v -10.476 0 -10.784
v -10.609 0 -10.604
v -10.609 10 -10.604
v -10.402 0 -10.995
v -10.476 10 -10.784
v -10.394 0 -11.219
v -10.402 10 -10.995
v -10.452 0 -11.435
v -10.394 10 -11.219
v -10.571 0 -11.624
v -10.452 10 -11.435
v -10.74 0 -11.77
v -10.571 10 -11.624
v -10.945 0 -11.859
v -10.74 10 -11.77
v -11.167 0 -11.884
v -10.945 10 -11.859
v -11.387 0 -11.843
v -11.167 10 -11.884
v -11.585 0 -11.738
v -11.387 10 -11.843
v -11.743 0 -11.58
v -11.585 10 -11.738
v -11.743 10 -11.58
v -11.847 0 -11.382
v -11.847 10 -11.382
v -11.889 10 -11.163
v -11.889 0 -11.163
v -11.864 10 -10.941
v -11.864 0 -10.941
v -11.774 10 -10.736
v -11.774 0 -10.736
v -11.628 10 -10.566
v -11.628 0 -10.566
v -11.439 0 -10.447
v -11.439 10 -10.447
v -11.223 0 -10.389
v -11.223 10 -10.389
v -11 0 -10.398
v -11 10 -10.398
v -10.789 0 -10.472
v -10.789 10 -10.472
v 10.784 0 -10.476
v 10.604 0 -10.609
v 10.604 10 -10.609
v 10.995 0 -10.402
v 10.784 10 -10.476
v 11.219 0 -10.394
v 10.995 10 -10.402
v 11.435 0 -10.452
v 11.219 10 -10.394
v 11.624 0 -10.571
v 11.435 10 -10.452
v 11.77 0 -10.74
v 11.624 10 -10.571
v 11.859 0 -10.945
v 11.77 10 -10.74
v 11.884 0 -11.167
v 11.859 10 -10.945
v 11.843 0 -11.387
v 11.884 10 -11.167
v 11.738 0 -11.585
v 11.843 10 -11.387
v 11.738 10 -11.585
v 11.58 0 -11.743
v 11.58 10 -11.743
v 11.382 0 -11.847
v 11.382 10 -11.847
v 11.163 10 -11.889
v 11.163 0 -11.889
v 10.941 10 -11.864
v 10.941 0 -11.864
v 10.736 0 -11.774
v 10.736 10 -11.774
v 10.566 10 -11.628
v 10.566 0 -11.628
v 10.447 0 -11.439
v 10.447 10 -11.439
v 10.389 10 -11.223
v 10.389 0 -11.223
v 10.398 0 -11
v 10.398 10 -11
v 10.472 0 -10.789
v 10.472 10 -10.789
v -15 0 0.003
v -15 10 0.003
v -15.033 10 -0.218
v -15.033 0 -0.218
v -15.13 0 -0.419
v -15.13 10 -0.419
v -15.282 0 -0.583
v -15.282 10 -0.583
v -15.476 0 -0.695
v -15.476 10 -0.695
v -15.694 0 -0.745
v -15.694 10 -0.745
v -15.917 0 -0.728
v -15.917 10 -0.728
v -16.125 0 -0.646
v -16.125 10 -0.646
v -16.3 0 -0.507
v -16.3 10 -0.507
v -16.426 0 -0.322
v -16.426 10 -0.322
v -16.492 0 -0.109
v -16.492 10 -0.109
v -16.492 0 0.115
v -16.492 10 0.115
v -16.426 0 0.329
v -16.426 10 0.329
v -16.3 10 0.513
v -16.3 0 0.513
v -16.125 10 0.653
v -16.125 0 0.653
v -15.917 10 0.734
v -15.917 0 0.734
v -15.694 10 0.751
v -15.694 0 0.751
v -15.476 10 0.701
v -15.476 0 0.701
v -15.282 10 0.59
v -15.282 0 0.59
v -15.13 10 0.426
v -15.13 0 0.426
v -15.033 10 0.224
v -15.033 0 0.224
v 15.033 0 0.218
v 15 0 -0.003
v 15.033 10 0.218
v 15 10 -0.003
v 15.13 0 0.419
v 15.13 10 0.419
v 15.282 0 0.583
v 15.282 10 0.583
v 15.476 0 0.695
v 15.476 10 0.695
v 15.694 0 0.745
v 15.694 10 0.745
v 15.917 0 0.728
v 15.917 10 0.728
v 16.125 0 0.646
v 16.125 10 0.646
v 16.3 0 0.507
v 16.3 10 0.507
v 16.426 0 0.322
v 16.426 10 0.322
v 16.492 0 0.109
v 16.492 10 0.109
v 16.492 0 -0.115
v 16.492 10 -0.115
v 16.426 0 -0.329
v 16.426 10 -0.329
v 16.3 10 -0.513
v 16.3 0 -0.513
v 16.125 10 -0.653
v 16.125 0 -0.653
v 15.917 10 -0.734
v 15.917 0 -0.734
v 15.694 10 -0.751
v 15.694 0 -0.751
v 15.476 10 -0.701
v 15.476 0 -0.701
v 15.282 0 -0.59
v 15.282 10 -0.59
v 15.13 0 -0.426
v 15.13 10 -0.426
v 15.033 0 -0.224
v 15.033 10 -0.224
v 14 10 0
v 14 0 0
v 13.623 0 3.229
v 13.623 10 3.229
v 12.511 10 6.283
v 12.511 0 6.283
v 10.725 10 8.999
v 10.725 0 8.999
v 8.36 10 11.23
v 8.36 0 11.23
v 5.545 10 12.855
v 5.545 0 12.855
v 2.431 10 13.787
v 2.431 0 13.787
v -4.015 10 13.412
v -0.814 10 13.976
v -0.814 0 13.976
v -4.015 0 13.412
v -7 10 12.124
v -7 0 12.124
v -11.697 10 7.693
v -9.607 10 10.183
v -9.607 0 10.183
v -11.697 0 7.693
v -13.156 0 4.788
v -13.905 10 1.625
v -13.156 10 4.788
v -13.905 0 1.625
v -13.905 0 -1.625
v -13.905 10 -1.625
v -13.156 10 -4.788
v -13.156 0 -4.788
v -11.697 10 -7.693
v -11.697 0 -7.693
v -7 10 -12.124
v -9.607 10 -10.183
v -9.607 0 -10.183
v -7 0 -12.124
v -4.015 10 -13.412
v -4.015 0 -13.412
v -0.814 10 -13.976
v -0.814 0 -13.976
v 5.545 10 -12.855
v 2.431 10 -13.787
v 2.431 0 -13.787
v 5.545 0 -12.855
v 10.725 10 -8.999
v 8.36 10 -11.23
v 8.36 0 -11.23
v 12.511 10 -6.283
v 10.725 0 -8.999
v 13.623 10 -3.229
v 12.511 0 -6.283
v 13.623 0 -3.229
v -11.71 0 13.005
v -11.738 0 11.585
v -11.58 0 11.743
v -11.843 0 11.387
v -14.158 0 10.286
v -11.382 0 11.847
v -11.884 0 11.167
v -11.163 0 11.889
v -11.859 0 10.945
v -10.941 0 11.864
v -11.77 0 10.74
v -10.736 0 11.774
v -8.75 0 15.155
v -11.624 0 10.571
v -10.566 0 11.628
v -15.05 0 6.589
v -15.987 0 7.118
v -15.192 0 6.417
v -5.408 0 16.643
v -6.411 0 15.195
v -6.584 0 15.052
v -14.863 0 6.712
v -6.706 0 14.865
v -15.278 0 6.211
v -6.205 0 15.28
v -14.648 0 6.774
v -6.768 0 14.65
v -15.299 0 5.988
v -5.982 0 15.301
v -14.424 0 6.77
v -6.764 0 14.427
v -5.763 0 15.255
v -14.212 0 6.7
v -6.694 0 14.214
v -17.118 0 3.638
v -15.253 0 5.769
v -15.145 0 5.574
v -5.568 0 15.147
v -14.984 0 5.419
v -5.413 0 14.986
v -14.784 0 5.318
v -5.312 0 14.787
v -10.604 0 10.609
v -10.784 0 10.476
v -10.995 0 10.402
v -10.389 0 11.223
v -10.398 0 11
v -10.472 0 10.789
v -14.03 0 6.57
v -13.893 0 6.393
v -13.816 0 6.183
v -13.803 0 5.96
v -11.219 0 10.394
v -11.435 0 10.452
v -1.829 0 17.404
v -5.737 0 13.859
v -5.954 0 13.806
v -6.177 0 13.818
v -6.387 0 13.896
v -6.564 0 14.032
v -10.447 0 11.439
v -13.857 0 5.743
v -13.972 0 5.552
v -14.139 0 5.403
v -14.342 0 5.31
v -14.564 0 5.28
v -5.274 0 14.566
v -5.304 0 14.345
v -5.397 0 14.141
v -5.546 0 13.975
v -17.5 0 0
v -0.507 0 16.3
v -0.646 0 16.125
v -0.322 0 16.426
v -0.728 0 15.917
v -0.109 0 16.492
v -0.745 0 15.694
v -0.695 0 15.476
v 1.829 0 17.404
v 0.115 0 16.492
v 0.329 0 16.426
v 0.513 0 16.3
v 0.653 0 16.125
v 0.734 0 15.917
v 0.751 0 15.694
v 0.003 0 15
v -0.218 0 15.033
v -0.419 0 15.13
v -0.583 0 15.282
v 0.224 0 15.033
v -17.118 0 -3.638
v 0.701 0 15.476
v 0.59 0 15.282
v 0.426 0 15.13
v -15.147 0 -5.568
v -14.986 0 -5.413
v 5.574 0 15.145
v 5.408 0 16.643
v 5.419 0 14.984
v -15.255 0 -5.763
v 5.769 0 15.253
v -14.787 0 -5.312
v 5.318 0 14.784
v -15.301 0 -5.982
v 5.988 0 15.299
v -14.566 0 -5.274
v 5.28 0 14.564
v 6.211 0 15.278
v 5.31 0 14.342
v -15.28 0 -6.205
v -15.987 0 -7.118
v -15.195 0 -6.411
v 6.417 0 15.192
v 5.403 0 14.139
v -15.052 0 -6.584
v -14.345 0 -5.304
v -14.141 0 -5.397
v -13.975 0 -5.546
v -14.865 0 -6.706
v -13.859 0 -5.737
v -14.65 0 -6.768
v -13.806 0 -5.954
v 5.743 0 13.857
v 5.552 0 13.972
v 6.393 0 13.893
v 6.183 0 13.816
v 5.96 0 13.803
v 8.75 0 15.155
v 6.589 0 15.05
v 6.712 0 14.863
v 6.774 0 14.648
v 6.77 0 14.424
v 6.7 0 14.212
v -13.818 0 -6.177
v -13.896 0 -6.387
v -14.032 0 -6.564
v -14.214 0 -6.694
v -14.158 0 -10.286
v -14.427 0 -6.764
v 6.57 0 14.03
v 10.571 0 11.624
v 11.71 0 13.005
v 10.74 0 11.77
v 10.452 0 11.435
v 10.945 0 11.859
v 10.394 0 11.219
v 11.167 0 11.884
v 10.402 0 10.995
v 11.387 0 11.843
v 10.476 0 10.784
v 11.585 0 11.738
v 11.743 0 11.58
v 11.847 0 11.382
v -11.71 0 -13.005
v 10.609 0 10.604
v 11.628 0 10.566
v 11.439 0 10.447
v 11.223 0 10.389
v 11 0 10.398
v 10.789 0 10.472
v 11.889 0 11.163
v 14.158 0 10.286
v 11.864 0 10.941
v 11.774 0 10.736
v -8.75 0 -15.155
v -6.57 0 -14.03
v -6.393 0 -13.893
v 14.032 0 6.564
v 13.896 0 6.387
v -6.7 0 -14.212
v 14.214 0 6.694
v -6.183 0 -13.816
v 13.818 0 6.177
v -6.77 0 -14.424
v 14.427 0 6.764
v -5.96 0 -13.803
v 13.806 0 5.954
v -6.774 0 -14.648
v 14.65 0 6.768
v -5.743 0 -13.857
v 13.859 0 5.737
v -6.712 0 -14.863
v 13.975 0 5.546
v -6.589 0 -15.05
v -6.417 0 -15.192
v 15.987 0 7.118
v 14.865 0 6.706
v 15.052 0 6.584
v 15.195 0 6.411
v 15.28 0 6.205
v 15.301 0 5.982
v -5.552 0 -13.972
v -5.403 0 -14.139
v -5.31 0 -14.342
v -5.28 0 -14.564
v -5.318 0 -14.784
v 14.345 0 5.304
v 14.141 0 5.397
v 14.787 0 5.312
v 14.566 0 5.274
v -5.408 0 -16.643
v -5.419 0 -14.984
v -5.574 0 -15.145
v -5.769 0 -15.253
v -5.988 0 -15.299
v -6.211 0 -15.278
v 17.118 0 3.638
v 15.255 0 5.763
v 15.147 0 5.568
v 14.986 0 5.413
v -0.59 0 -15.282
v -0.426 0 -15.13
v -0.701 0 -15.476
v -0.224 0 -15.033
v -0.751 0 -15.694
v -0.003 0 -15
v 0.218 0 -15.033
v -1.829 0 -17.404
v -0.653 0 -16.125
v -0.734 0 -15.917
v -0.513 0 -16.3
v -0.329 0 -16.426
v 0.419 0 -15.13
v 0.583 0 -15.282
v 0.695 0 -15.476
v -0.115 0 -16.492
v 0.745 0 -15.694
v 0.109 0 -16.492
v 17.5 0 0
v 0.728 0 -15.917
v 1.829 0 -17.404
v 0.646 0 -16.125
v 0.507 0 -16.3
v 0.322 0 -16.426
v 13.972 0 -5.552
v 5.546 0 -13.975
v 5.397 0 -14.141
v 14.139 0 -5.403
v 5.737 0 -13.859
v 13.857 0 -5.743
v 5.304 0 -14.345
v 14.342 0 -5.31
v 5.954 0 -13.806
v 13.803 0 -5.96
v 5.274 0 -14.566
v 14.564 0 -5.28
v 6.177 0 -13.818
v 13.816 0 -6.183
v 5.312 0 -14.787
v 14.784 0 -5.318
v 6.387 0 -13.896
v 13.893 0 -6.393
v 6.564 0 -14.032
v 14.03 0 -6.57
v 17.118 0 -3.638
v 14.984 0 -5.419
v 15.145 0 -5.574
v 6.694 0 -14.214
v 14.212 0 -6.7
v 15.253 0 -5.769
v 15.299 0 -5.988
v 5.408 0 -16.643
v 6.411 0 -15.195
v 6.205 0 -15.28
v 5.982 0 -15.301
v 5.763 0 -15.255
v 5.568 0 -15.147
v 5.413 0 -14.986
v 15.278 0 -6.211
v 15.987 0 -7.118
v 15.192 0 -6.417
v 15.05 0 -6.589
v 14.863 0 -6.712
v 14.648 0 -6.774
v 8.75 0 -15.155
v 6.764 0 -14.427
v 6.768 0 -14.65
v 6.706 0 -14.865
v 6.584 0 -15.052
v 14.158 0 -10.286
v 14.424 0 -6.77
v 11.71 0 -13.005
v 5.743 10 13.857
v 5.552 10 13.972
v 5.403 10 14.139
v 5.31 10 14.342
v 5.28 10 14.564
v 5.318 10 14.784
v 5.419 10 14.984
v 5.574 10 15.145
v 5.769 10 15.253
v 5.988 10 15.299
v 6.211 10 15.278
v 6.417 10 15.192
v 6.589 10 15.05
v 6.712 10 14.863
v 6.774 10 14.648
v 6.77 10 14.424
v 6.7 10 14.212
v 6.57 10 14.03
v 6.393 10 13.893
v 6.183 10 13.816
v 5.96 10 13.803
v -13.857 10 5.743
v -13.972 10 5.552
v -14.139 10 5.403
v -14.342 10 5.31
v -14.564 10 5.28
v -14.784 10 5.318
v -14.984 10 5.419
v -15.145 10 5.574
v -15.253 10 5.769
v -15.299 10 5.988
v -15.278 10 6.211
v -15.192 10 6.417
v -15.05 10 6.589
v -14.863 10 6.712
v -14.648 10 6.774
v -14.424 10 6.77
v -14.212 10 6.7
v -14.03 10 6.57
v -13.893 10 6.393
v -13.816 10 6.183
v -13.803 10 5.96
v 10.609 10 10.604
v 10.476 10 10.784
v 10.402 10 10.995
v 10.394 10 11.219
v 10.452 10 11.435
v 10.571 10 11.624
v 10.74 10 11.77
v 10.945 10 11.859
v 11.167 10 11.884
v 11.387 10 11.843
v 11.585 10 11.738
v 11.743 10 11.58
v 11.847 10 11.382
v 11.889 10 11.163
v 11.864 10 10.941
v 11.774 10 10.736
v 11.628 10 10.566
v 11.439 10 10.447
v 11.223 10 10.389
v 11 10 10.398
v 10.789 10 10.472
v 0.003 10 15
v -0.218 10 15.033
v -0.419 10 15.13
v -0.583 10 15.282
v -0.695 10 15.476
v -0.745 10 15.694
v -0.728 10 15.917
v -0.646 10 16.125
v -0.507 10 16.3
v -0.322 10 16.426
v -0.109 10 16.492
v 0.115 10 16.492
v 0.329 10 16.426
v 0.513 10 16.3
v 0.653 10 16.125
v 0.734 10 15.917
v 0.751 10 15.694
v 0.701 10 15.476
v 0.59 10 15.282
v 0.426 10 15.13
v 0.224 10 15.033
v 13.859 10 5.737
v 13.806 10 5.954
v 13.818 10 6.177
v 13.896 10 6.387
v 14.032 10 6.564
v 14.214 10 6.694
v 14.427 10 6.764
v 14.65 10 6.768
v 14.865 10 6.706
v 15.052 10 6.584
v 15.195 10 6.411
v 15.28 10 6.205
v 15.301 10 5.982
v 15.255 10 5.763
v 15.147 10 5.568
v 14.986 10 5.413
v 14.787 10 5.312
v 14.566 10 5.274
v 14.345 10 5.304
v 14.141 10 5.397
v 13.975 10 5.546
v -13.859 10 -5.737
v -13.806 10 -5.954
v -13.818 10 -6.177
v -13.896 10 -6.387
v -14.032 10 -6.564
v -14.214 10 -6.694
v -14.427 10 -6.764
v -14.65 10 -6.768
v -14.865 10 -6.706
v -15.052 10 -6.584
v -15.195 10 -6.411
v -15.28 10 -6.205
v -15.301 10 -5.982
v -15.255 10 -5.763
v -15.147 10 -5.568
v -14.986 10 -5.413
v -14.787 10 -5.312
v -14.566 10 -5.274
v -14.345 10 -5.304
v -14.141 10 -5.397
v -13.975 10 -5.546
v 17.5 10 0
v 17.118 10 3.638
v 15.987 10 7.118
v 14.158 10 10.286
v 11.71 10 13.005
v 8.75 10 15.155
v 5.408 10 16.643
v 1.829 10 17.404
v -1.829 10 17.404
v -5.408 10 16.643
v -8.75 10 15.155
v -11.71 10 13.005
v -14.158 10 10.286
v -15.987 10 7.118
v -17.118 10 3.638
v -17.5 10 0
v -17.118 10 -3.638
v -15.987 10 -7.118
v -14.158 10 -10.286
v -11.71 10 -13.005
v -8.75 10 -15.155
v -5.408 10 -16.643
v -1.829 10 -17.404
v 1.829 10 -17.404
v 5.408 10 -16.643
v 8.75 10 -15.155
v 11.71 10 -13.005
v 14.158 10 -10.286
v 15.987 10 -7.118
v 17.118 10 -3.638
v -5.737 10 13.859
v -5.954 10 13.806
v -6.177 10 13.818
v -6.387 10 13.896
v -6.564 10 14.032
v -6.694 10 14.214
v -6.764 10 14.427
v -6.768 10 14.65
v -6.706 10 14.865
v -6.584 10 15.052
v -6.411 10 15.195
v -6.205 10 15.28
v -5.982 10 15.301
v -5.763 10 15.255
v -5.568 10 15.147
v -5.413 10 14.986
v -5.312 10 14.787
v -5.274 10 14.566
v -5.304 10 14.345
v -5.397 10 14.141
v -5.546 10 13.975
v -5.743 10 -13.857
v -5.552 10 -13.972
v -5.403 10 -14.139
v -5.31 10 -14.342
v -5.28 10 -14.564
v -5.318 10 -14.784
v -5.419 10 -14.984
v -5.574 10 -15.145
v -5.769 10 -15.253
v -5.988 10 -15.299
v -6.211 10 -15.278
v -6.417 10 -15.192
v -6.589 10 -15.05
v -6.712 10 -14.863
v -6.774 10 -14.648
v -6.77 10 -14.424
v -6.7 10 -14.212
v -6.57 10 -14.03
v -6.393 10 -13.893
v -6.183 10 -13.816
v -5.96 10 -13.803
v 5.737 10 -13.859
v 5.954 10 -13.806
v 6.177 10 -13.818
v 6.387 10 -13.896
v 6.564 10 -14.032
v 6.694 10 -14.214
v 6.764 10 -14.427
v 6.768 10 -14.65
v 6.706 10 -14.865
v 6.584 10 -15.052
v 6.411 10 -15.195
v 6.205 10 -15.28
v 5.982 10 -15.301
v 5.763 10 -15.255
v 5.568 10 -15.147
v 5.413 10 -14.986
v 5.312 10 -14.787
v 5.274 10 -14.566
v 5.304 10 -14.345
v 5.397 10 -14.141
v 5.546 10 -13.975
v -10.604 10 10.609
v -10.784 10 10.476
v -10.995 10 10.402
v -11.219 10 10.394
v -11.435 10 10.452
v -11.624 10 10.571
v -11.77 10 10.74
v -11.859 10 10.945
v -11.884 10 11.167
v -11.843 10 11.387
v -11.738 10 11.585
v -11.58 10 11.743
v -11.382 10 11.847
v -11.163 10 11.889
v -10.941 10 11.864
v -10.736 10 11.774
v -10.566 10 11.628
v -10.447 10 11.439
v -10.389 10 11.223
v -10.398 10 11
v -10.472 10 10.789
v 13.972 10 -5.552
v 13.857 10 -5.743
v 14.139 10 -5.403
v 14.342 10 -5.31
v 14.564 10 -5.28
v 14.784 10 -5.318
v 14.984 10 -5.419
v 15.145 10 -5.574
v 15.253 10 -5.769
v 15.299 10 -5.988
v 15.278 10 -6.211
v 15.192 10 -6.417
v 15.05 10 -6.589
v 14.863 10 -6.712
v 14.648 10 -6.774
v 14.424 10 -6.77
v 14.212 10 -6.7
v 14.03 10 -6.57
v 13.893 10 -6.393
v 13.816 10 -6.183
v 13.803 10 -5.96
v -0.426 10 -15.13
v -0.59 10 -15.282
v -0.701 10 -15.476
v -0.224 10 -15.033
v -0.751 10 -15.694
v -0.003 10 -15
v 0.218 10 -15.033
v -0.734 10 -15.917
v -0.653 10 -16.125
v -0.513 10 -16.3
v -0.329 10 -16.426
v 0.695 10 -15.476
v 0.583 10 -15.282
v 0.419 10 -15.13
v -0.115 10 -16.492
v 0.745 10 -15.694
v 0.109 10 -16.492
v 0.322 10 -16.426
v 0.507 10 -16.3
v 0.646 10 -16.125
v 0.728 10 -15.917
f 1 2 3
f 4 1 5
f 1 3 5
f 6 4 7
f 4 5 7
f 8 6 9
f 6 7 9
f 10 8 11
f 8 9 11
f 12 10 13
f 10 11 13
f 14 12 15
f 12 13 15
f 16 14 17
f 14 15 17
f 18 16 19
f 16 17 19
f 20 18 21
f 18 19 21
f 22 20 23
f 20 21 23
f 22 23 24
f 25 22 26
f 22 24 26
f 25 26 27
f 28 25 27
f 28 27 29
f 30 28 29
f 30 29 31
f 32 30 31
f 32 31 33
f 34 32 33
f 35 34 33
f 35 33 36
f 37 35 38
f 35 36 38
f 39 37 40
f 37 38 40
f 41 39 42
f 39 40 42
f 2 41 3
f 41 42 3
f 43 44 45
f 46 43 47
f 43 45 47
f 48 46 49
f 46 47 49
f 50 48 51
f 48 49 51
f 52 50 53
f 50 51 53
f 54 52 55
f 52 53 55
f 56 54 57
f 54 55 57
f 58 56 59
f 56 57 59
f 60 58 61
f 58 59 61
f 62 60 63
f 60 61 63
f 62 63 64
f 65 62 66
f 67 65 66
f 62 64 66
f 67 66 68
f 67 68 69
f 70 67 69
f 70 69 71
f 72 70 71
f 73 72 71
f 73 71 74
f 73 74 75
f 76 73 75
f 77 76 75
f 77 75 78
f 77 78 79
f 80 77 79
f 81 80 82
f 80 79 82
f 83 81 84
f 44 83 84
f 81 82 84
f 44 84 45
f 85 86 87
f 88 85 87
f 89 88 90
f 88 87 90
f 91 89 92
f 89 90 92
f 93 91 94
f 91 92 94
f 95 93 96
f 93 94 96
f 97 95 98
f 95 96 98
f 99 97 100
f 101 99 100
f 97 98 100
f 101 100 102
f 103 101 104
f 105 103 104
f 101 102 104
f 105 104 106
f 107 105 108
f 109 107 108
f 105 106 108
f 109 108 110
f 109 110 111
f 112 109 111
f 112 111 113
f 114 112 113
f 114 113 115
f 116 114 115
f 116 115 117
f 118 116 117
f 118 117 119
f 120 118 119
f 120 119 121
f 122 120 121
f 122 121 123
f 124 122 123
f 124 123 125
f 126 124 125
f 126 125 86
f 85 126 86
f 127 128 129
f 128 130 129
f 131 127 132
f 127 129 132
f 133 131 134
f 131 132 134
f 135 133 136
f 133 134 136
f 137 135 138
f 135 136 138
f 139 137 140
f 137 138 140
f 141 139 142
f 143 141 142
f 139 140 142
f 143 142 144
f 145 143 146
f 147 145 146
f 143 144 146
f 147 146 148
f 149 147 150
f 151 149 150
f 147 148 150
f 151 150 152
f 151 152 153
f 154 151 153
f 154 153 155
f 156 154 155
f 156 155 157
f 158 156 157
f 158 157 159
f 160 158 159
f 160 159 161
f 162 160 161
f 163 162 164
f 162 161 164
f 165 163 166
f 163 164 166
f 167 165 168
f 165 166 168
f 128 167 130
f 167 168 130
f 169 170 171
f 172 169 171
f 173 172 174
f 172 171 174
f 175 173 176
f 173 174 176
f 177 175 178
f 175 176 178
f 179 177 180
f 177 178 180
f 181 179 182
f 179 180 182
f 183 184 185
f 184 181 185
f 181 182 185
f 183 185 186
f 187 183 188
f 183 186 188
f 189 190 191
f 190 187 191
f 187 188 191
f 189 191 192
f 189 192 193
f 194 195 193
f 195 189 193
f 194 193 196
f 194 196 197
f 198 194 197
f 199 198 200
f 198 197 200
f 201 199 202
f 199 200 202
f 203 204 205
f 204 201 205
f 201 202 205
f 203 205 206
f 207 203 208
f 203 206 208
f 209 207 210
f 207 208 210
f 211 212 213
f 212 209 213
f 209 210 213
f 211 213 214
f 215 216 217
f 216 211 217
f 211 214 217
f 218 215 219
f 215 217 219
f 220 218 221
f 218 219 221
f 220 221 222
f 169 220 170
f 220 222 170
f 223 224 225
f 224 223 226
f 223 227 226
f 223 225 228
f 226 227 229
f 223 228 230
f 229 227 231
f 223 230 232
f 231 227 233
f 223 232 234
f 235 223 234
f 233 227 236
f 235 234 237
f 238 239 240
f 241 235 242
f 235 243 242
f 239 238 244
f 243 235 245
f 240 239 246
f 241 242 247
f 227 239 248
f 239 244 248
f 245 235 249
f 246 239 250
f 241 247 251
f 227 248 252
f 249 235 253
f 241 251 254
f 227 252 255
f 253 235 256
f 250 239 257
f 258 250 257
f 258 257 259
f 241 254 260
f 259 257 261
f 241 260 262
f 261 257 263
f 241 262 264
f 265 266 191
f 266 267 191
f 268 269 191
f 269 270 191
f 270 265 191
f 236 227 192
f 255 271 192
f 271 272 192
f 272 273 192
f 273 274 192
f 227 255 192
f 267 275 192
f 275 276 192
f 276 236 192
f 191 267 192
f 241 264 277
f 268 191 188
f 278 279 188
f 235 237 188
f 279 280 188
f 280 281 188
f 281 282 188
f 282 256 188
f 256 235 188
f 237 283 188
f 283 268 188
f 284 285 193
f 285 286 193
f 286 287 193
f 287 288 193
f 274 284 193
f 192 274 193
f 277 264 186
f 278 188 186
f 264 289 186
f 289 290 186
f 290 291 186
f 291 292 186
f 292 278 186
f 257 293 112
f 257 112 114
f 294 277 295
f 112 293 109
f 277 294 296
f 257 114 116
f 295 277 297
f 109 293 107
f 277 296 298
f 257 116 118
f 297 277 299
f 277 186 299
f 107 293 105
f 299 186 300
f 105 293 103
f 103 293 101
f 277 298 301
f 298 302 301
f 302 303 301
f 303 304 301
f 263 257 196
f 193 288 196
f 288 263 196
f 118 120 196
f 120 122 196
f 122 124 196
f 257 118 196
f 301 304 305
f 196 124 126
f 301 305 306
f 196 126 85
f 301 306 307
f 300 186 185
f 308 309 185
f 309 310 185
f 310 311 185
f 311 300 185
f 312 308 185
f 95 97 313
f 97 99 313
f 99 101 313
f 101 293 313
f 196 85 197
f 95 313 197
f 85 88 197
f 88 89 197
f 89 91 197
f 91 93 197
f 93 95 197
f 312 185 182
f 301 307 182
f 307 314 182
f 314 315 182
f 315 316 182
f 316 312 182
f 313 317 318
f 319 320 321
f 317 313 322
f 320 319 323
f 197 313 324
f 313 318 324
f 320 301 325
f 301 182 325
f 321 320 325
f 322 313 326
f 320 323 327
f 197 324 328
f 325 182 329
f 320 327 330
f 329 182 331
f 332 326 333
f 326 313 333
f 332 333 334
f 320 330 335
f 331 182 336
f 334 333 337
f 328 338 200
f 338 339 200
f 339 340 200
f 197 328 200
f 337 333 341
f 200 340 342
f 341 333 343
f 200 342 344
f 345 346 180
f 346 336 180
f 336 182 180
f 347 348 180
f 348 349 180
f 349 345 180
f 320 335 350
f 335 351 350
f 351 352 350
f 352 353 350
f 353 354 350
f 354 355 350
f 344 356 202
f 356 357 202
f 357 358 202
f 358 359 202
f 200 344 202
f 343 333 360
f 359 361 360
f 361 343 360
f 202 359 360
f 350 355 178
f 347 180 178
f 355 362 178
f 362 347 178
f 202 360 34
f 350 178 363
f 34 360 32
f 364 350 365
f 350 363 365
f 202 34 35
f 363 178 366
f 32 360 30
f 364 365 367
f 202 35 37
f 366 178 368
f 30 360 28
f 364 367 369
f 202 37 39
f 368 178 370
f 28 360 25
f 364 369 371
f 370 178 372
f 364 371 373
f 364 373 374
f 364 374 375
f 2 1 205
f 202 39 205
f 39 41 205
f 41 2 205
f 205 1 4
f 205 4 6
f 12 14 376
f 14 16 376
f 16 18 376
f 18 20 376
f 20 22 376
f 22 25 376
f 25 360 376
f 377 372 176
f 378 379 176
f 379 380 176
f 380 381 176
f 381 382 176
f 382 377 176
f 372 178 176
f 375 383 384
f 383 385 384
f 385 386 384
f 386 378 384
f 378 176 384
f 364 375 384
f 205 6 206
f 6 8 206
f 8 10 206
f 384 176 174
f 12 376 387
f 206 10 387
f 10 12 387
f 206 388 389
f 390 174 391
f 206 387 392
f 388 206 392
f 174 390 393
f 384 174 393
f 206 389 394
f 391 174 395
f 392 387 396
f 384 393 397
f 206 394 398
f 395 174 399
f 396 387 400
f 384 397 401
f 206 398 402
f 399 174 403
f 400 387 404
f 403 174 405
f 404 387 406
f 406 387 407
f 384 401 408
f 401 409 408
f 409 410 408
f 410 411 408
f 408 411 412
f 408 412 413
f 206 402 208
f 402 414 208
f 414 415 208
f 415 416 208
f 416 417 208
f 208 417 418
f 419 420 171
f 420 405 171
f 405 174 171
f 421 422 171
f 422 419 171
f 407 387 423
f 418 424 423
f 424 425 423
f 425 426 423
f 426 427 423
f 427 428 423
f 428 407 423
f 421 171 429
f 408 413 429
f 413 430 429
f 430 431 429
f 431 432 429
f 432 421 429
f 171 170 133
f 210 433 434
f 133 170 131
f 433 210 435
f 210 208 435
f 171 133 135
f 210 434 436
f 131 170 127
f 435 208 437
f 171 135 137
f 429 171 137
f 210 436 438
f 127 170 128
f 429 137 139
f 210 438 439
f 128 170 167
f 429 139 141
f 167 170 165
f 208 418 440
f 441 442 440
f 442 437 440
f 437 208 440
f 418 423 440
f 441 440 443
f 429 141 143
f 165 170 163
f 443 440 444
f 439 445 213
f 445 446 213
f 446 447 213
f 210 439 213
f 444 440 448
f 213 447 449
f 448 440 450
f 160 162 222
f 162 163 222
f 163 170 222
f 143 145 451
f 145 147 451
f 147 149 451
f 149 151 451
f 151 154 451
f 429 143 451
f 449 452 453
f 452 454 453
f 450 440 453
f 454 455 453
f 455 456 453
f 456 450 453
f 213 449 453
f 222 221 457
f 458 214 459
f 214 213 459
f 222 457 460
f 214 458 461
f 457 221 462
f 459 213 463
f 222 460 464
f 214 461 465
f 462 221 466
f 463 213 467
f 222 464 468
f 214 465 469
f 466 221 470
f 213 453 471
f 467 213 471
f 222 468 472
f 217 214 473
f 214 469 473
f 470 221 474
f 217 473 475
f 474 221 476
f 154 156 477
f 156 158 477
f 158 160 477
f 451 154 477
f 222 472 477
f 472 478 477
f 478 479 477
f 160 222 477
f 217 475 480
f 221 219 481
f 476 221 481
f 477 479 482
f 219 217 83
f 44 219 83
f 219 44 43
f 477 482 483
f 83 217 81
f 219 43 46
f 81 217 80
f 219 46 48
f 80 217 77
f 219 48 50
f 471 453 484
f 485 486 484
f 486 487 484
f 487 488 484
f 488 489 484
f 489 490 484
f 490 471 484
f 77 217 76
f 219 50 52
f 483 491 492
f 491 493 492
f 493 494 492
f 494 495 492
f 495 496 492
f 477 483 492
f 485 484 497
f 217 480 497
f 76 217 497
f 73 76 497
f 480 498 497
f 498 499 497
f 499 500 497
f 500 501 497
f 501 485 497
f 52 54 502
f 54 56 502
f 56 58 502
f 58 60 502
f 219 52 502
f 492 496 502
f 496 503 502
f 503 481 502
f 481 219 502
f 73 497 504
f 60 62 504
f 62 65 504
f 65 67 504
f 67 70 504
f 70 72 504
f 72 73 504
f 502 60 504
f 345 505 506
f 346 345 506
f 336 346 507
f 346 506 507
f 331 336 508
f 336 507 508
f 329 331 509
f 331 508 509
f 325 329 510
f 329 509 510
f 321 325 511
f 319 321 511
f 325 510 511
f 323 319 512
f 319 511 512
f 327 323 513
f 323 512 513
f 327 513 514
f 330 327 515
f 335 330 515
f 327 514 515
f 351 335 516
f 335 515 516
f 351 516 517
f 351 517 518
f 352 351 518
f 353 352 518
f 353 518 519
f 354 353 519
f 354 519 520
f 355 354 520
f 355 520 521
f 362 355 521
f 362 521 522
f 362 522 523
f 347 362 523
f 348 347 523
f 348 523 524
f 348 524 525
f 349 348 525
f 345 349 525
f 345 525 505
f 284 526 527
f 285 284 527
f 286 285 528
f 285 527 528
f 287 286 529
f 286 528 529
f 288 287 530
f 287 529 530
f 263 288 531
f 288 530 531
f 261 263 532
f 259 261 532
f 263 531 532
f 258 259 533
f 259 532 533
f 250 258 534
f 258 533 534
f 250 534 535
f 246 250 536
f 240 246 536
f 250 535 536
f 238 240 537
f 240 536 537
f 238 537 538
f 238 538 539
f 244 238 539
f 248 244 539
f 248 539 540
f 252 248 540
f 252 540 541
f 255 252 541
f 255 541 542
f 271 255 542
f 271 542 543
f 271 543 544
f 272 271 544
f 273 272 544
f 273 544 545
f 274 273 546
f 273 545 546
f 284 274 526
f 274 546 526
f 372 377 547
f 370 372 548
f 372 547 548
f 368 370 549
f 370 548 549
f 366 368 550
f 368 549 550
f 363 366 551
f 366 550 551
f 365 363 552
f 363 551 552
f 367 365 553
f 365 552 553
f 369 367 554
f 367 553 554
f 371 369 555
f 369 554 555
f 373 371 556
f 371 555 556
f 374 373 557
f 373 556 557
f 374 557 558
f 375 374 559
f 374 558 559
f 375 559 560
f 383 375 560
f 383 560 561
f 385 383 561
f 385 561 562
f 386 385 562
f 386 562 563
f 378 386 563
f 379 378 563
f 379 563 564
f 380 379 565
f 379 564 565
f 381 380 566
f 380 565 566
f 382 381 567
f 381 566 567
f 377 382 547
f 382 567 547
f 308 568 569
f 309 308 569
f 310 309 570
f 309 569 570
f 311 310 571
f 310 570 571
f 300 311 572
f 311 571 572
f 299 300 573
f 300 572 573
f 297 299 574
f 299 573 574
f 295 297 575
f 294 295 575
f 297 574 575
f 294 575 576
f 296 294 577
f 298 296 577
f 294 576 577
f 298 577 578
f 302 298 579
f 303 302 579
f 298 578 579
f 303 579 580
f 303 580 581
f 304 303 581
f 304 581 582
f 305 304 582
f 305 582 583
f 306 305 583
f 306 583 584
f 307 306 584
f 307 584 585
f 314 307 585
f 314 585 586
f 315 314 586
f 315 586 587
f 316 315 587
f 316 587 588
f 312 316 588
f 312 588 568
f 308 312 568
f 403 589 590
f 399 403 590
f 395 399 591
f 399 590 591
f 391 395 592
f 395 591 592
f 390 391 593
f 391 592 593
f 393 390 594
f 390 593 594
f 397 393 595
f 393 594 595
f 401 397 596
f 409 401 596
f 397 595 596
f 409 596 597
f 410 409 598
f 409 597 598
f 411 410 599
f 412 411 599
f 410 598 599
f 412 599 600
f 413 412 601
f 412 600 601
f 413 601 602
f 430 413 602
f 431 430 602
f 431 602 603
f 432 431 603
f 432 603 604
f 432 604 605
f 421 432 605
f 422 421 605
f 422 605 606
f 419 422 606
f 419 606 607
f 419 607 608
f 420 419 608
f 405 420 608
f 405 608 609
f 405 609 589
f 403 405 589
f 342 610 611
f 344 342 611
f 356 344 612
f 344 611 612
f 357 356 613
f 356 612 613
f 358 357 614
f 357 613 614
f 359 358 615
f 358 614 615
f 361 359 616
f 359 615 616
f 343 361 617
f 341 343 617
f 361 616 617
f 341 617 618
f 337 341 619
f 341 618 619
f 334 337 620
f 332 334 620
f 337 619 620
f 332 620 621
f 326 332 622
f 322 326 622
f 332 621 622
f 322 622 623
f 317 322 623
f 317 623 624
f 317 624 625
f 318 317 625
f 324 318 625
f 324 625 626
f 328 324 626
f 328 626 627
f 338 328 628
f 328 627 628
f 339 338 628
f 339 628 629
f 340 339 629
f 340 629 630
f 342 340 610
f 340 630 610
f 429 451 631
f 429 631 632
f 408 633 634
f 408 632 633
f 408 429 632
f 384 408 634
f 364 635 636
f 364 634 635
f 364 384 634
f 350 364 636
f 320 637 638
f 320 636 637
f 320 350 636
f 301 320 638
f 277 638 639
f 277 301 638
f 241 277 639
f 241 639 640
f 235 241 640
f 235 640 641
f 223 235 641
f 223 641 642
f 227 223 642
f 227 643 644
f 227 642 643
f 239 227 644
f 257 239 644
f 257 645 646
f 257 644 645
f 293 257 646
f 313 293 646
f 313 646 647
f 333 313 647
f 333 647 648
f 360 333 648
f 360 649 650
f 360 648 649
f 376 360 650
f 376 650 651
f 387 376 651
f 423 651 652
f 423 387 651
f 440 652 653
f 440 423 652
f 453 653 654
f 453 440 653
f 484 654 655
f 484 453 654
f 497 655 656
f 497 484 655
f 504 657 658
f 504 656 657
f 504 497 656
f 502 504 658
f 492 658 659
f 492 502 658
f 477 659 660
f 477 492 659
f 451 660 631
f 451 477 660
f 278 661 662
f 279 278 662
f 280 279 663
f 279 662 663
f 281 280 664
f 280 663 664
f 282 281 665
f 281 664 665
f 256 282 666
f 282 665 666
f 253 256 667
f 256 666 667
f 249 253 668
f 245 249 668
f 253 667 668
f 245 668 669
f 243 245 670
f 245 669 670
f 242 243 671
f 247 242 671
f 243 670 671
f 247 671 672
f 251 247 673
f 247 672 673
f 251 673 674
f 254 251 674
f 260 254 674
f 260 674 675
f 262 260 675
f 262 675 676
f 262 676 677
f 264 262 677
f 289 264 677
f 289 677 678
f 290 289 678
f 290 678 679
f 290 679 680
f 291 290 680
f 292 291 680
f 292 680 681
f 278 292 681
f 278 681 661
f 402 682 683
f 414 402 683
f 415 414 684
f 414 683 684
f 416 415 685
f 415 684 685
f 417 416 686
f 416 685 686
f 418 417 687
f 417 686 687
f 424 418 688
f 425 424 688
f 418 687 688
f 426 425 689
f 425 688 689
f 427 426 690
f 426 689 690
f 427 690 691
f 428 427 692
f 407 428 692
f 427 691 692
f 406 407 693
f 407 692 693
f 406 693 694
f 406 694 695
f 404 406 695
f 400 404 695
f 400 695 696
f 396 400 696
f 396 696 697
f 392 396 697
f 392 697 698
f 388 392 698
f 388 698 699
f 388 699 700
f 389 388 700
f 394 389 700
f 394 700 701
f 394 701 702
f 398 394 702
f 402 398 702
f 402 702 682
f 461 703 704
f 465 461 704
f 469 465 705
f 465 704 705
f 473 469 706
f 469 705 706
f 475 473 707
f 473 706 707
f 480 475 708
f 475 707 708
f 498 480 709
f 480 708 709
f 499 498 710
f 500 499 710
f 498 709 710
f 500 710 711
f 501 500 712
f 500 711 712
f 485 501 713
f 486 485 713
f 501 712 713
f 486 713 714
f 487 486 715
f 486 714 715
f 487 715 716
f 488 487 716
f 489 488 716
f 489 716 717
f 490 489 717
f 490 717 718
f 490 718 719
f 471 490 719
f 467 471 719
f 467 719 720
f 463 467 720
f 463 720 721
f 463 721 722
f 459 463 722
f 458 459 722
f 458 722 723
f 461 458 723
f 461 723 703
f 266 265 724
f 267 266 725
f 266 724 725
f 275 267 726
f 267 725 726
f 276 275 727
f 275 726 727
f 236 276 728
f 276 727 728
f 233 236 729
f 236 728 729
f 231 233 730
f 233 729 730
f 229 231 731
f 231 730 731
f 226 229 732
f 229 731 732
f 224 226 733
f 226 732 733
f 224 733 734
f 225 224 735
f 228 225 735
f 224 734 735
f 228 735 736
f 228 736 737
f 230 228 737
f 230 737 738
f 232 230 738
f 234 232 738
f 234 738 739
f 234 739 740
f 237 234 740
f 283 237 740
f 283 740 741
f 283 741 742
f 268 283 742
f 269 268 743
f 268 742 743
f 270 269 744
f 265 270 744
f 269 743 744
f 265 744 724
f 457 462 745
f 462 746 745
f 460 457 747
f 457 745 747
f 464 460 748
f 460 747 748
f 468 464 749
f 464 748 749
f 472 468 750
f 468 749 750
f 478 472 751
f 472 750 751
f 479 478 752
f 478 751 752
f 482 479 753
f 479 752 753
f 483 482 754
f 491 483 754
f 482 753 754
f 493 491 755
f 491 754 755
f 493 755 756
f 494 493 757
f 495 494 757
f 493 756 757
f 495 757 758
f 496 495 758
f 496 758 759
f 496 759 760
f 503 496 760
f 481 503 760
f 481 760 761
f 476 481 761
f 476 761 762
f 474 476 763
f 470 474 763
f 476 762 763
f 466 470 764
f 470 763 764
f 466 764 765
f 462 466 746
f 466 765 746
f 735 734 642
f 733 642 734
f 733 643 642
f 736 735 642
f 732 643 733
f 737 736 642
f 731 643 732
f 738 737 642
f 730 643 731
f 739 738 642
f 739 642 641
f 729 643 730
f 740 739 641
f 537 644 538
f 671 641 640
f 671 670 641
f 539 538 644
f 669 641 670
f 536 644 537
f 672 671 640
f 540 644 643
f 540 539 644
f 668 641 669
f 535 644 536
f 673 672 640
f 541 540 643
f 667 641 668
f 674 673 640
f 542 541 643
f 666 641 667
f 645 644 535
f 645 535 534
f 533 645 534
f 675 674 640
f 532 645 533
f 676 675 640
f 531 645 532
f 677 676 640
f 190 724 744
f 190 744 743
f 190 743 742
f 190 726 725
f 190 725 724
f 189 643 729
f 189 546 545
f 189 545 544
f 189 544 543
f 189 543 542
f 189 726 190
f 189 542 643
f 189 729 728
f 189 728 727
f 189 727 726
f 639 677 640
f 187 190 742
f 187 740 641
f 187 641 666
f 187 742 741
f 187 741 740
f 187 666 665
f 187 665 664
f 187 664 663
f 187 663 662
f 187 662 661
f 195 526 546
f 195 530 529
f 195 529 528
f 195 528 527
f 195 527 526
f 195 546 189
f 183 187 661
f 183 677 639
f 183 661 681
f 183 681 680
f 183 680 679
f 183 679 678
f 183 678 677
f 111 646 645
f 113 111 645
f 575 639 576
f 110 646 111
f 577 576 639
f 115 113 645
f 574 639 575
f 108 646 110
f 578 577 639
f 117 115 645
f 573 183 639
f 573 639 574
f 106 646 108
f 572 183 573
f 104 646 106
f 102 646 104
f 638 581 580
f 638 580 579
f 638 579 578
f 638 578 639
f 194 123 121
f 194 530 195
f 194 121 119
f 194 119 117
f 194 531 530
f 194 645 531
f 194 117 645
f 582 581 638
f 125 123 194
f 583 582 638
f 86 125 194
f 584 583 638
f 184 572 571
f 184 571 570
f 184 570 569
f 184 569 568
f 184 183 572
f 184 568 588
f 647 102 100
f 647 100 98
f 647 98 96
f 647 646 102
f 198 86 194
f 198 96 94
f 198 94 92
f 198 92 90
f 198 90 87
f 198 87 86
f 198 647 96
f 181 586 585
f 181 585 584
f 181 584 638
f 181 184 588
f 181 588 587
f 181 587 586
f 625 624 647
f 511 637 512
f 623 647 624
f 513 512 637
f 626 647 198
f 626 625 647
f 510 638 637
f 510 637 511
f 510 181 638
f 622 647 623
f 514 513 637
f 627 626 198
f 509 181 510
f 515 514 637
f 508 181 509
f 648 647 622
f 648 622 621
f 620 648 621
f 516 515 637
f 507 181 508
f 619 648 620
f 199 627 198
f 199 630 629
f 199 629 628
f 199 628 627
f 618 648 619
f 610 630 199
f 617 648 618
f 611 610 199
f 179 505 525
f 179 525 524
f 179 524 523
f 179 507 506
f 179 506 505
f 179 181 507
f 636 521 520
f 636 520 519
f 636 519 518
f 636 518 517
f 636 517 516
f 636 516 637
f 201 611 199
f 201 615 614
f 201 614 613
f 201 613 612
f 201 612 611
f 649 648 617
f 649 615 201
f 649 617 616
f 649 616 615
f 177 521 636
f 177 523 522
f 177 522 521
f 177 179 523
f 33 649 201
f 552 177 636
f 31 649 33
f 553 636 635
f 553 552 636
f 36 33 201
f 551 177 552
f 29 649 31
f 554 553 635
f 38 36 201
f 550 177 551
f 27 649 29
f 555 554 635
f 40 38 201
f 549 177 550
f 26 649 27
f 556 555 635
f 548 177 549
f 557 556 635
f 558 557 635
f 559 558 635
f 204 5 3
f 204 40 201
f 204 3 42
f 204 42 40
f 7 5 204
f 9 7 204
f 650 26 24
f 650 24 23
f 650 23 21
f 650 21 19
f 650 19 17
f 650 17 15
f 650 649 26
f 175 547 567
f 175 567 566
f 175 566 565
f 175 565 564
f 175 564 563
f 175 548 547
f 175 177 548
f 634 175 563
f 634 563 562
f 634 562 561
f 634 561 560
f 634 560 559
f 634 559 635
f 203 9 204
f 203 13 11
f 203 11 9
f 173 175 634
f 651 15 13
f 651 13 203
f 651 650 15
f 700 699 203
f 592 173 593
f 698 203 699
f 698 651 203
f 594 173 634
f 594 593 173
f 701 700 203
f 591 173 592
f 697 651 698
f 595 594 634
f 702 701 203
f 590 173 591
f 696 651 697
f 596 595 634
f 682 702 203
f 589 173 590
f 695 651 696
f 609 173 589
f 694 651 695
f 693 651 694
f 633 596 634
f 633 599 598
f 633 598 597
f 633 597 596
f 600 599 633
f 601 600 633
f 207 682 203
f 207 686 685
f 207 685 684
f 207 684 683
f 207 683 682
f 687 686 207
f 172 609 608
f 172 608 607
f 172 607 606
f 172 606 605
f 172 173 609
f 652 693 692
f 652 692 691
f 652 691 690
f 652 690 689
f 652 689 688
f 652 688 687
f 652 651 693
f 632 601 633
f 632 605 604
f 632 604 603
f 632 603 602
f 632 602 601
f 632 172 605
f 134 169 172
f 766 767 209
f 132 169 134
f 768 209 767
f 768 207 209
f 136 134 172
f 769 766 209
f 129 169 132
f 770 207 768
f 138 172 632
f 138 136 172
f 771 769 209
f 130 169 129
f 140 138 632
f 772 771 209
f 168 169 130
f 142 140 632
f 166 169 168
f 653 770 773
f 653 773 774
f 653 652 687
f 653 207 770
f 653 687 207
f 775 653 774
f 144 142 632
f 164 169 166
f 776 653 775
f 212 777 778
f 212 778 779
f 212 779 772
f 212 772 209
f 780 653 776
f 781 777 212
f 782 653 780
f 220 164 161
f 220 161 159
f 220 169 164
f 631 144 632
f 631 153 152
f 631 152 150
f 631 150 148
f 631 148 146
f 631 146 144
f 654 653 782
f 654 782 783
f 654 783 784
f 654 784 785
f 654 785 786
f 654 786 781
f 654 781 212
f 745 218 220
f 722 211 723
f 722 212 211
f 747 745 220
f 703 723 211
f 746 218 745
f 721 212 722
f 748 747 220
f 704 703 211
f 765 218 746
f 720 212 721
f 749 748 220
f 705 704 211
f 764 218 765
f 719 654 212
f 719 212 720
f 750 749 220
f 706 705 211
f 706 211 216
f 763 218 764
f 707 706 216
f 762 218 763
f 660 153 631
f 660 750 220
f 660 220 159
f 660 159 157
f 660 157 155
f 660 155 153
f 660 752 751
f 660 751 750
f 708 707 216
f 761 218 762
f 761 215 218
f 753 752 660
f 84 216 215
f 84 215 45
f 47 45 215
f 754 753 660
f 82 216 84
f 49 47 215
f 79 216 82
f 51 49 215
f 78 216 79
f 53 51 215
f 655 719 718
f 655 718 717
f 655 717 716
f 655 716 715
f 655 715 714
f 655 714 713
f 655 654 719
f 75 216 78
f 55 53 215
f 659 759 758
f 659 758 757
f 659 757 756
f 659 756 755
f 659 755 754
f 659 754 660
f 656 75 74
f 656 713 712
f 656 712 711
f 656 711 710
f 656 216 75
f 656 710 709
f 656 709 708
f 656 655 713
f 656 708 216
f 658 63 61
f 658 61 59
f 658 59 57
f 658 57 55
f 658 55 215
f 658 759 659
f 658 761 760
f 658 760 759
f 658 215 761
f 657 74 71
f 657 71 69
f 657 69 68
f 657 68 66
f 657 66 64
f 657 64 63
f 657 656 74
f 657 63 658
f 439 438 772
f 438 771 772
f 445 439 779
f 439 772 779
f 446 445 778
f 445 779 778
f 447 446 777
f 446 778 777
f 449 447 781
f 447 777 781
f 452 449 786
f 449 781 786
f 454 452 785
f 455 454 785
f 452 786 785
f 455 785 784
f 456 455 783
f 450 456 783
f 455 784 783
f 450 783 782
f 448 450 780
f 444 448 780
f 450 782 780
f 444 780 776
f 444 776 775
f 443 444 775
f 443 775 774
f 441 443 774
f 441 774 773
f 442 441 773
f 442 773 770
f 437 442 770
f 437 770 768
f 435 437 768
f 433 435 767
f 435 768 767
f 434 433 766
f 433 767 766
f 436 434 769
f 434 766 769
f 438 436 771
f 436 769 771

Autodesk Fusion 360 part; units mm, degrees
sketch "Sketch1" plane through (0, 0, 0) normal (0, 1, 0) x (1, 0, 0)
  circle A0 centre (0, 0) radius 17.5
  circle A1 centre (0, 0) radius 14
  dimension "d1" = 35
  dimension "d2" = 28
extrude "Extrude1" add sketch "Sketch1" along normal blind 10
sketch "Sketch2" plane through (0, 10, 0) normal (0, 1, 0) x (-1, 0, 0)
  circle A0 centre (0, 0) radius 14
  circle A1 centre (0, 0) radius 17.5
  line L0 (-14, -0.0032) -> (-17.5, -0.0032)
  circle A2 centre (-15.75, -0.0032) radius 0.75
  dimension "d5" = 3.5
  dimension "d6" = 1.5
extrude "Extrude2" cut sketch "Sketch2" against normal blind 10 contours L0 A2 | L0 A2
pattern_circular "C-Pattern1" count 16 over 360 about axis through (0, 1.75, 0) along (0, 1, 0) of "Extrude2"
